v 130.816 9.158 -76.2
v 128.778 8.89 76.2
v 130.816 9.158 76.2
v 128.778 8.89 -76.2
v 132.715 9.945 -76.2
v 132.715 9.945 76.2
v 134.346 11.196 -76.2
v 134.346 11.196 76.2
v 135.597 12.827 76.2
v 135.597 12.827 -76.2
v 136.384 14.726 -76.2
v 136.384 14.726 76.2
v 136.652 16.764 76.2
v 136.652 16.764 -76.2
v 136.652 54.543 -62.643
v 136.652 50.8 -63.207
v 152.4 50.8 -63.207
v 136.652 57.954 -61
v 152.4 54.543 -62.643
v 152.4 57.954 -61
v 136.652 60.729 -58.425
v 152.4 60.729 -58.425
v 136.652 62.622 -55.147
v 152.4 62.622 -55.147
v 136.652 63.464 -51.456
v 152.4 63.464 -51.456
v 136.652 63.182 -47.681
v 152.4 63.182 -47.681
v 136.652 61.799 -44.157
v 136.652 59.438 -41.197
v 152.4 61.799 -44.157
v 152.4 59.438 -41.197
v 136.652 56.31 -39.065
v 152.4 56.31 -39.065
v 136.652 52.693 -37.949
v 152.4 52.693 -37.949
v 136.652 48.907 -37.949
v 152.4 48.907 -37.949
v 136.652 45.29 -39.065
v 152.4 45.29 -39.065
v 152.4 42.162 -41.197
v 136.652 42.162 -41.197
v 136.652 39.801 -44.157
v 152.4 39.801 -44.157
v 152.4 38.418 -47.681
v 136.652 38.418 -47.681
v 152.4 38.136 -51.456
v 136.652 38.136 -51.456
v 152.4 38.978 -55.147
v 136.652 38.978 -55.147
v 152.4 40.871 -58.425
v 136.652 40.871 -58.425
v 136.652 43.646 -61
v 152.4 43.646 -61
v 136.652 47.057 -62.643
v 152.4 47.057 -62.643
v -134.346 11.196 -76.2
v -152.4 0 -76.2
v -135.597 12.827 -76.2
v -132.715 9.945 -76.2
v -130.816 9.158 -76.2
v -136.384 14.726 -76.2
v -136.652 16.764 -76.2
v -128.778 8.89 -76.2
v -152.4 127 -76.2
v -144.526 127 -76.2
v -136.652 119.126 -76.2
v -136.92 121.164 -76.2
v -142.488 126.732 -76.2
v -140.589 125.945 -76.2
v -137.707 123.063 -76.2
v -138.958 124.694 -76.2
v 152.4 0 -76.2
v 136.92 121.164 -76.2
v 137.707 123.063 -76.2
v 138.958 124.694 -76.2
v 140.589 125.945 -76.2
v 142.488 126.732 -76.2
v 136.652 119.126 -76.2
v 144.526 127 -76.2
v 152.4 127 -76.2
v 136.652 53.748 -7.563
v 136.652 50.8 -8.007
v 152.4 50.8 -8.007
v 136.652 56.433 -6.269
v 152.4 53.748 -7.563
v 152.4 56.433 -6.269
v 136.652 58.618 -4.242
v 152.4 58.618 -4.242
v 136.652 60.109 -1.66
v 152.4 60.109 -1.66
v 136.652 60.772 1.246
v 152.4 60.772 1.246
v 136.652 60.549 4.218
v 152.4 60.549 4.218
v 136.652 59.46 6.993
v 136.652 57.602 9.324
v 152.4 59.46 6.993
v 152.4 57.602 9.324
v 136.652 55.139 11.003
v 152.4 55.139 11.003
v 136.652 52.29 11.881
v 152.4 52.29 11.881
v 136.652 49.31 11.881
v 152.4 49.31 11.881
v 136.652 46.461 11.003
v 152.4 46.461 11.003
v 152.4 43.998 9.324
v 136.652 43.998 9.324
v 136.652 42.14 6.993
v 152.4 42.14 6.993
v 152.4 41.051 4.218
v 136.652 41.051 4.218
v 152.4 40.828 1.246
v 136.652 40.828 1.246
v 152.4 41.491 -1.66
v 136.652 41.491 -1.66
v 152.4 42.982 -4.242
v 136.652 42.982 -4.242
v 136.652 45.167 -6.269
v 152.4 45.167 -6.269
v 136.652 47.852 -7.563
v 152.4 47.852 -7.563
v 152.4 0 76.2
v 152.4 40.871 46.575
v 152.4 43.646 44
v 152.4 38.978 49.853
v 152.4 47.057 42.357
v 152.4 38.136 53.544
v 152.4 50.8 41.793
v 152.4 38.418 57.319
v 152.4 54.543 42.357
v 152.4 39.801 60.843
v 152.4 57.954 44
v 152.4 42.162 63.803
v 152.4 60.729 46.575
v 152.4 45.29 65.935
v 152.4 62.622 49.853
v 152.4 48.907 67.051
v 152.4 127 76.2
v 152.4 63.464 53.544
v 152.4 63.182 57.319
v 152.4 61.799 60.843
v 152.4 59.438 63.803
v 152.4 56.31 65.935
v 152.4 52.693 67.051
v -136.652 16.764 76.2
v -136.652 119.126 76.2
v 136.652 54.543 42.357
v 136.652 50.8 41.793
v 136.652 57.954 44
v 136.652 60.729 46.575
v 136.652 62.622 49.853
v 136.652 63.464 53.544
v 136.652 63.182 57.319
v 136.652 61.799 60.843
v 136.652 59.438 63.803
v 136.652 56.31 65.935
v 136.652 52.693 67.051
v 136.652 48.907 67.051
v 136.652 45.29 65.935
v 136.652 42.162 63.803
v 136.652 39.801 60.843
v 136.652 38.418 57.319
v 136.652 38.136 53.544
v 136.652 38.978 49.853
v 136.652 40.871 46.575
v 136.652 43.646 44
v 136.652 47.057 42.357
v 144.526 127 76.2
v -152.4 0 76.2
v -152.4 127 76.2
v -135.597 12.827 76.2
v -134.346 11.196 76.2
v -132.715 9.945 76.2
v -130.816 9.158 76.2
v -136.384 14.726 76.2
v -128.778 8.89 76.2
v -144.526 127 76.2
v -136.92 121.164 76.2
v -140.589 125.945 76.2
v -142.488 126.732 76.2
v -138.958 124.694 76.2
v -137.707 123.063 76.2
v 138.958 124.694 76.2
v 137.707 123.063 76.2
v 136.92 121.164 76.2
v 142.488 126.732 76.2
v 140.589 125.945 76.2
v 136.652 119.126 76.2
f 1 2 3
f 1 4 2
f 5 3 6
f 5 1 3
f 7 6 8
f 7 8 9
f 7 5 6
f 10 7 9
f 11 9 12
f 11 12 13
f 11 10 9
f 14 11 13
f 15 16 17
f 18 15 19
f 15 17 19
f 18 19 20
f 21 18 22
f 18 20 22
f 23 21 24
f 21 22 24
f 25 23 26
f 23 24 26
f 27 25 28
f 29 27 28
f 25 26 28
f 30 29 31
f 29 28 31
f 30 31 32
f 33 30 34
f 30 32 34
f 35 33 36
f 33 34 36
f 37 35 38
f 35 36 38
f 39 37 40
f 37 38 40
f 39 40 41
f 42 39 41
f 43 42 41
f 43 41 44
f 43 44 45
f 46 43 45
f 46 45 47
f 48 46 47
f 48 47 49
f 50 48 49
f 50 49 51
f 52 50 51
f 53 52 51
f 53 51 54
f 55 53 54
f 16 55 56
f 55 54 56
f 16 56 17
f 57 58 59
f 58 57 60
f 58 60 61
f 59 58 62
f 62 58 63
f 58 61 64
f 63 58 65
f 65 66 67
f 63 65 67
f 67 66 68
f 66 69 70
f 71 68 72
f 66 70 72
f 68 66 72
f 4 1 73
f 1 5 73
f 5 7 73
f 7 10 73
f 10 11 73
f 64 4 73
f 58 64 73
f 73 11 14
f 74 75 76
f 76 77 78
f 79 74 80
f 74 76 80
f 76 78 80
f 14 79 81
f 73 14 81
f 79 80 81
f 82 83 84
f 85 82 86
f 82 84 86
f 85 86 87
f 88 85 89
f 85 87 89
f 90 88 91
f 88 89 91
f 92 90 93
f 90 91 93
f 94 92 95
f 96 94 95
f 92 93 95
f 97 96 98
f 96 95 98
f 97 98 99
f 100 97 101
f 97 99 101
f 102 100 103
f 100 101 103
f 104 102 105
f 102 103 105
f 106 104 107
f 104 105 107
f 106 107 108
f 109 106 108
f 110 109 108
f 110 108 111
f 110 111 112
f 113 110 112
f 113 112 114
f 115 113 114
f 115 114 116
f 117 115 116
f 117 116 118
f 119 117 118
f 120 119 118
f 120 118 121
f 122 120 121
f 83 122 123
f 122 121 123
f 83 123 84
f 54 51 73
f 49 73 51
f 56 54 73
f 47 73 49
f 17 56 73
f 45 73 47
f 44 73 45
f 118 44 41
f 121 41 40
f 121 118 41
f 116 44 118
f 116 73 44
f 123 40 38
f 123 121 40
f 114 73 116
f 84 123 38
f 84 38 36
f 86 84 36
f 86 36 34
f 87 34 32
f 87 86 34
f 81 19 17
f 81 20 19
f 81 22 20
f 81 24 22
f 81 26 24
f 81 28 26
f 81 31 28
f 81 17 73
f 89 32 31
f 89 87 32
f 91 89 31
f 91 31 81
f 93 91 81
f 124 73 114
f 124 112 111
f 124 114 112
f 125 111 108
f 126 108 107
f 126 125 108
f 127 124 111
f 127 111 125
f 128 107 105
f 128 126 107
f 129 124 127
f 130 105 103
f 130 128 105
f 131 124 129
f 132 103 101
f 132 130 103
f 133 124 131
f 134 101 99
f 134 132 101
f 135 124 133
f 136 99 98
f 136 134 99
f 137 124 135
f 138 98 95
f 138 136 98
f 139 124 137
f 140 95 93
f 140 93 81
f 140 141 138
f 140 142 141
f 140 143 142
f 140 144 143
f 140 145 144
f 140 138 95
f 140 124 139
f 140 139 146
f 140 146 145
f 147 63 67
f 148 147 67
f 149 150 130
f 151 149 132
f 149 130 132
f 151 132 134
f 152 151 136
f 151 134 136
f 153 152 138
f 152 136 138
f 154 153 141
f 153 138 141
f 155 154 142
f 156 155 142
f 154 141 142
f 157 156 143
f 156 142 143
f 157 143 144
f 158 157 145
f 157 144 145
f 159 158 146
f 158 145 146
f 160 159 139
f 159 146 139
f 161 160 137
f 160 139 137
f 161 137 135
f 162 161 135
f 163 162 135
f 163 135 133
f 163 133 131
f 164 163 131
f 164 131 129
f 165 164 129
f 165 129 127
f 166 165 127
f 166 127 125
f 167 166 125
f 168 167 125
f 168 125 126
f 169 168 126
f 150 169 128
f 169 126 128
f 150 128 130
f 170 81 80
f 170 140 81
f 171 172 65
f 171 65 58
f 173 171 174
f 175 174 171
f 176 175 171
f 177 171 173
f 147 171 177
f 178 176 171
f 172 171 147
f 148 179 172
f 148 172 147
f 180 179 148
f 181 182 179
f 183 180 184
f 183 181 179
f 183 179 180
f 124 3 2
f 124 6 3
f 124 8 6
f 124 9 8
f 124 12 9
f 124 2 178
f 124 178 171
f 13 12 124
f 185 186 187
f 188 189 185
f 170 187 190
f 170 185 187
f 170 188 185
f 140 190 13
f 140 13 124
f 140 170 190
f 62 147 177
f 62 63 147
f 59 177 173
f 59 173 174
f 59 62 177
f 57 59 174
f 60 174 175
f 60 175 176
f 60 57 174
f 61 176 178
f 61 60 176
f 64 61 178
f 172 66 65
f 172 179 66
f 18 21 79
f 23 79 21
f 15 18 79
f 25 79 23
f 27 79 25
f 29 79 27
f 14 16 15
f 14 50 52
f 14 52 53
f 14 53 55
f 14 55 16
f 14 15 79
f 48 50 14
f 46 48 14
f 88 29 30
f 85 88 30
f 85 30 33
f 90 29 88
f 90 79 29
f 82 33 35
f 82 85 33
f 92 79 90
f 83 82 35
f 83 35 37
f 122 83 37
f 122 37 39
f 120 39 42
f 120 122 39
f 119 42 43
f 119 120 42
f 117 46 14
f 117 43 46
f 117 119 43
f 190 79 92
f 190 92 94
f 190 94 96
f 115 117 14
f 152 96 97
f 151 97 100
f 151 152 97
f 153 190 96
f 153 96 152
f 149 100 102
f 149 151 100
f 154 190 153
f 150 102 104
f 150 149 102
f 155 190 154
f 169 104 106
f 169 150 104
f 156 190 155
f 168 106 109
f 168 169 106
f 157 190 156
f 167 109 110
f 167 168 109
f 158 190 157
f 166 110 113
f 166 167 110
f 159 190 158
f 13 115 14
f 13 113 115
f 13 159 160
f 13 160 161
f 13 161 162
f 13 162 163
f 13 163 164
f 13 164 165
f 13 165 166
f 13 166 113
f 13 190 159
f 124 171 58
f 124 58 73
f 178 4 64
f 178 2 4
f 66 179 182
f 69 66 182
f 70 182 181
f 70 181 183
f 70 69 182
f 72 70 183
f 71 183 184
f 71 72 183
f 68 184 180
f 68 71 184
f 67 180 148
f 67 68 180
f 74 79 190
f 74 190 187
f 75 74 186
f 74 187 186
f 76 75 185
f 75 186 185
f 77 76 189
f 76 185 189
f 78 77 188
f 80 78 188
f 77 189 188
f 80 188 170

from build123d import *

# Parameters (mm, degrees)
BOSS_EXTRUDE1_DEPTH = 76.2
FILLET1_R           = 7.874
SKETCH3_R           = 12.7
SKETCH3_R_2         = 10
CUT_EXTRUDE1_DEPTH  = 15.748


with BuildPart() as part:
    # Sketch1 → Boss-Extrude1 (new body, symmetric)
    with BuildSketch(Plane.XY):
        Polygon((-136.652, 127), (-152.4, 127), (-152.4, 0), (152.4, 0), (152.4, 127), (136.652, 127), (136.652, 8.89), (-136.652, 8.89), align=None)
    extrude(amount=BOSS_EXTRUDE1_DEPTH, both=True)

    # Fillet1
    fillet1_edges = [part.edges().sort_by_distance(p)[0] for p in [
        (-136.652, 8.89, 0),
        (136.652, 8.89, 0),
        (136.652, 127, 0),
        (-136.652, 127, 0),
    ]]
    fillet(fillet1_edges, radius=FILLET1_R)

    # Sketch3 → Cut-Extrude1 (cut)
    with BuildSketch(Plane(origin=(152.4, 0, 0), x_dir=(0, 0, -1), z_dir=(1, 0, 0))):
        with Locations((50.506866673, 50.8)):
            Circle(SKETCH3_R)
        with Locations((-54.493133327, 50.8)):
            Circle(SKETCH3_R)
        with Locations((-1.993133327, 50.8)):
            Circle(SKETCH3_R_2)
    extrude(amount=-CUT_EXTRUDE1_DEPTH, mode=Mode.SUBTRACT)


solid = part.part
